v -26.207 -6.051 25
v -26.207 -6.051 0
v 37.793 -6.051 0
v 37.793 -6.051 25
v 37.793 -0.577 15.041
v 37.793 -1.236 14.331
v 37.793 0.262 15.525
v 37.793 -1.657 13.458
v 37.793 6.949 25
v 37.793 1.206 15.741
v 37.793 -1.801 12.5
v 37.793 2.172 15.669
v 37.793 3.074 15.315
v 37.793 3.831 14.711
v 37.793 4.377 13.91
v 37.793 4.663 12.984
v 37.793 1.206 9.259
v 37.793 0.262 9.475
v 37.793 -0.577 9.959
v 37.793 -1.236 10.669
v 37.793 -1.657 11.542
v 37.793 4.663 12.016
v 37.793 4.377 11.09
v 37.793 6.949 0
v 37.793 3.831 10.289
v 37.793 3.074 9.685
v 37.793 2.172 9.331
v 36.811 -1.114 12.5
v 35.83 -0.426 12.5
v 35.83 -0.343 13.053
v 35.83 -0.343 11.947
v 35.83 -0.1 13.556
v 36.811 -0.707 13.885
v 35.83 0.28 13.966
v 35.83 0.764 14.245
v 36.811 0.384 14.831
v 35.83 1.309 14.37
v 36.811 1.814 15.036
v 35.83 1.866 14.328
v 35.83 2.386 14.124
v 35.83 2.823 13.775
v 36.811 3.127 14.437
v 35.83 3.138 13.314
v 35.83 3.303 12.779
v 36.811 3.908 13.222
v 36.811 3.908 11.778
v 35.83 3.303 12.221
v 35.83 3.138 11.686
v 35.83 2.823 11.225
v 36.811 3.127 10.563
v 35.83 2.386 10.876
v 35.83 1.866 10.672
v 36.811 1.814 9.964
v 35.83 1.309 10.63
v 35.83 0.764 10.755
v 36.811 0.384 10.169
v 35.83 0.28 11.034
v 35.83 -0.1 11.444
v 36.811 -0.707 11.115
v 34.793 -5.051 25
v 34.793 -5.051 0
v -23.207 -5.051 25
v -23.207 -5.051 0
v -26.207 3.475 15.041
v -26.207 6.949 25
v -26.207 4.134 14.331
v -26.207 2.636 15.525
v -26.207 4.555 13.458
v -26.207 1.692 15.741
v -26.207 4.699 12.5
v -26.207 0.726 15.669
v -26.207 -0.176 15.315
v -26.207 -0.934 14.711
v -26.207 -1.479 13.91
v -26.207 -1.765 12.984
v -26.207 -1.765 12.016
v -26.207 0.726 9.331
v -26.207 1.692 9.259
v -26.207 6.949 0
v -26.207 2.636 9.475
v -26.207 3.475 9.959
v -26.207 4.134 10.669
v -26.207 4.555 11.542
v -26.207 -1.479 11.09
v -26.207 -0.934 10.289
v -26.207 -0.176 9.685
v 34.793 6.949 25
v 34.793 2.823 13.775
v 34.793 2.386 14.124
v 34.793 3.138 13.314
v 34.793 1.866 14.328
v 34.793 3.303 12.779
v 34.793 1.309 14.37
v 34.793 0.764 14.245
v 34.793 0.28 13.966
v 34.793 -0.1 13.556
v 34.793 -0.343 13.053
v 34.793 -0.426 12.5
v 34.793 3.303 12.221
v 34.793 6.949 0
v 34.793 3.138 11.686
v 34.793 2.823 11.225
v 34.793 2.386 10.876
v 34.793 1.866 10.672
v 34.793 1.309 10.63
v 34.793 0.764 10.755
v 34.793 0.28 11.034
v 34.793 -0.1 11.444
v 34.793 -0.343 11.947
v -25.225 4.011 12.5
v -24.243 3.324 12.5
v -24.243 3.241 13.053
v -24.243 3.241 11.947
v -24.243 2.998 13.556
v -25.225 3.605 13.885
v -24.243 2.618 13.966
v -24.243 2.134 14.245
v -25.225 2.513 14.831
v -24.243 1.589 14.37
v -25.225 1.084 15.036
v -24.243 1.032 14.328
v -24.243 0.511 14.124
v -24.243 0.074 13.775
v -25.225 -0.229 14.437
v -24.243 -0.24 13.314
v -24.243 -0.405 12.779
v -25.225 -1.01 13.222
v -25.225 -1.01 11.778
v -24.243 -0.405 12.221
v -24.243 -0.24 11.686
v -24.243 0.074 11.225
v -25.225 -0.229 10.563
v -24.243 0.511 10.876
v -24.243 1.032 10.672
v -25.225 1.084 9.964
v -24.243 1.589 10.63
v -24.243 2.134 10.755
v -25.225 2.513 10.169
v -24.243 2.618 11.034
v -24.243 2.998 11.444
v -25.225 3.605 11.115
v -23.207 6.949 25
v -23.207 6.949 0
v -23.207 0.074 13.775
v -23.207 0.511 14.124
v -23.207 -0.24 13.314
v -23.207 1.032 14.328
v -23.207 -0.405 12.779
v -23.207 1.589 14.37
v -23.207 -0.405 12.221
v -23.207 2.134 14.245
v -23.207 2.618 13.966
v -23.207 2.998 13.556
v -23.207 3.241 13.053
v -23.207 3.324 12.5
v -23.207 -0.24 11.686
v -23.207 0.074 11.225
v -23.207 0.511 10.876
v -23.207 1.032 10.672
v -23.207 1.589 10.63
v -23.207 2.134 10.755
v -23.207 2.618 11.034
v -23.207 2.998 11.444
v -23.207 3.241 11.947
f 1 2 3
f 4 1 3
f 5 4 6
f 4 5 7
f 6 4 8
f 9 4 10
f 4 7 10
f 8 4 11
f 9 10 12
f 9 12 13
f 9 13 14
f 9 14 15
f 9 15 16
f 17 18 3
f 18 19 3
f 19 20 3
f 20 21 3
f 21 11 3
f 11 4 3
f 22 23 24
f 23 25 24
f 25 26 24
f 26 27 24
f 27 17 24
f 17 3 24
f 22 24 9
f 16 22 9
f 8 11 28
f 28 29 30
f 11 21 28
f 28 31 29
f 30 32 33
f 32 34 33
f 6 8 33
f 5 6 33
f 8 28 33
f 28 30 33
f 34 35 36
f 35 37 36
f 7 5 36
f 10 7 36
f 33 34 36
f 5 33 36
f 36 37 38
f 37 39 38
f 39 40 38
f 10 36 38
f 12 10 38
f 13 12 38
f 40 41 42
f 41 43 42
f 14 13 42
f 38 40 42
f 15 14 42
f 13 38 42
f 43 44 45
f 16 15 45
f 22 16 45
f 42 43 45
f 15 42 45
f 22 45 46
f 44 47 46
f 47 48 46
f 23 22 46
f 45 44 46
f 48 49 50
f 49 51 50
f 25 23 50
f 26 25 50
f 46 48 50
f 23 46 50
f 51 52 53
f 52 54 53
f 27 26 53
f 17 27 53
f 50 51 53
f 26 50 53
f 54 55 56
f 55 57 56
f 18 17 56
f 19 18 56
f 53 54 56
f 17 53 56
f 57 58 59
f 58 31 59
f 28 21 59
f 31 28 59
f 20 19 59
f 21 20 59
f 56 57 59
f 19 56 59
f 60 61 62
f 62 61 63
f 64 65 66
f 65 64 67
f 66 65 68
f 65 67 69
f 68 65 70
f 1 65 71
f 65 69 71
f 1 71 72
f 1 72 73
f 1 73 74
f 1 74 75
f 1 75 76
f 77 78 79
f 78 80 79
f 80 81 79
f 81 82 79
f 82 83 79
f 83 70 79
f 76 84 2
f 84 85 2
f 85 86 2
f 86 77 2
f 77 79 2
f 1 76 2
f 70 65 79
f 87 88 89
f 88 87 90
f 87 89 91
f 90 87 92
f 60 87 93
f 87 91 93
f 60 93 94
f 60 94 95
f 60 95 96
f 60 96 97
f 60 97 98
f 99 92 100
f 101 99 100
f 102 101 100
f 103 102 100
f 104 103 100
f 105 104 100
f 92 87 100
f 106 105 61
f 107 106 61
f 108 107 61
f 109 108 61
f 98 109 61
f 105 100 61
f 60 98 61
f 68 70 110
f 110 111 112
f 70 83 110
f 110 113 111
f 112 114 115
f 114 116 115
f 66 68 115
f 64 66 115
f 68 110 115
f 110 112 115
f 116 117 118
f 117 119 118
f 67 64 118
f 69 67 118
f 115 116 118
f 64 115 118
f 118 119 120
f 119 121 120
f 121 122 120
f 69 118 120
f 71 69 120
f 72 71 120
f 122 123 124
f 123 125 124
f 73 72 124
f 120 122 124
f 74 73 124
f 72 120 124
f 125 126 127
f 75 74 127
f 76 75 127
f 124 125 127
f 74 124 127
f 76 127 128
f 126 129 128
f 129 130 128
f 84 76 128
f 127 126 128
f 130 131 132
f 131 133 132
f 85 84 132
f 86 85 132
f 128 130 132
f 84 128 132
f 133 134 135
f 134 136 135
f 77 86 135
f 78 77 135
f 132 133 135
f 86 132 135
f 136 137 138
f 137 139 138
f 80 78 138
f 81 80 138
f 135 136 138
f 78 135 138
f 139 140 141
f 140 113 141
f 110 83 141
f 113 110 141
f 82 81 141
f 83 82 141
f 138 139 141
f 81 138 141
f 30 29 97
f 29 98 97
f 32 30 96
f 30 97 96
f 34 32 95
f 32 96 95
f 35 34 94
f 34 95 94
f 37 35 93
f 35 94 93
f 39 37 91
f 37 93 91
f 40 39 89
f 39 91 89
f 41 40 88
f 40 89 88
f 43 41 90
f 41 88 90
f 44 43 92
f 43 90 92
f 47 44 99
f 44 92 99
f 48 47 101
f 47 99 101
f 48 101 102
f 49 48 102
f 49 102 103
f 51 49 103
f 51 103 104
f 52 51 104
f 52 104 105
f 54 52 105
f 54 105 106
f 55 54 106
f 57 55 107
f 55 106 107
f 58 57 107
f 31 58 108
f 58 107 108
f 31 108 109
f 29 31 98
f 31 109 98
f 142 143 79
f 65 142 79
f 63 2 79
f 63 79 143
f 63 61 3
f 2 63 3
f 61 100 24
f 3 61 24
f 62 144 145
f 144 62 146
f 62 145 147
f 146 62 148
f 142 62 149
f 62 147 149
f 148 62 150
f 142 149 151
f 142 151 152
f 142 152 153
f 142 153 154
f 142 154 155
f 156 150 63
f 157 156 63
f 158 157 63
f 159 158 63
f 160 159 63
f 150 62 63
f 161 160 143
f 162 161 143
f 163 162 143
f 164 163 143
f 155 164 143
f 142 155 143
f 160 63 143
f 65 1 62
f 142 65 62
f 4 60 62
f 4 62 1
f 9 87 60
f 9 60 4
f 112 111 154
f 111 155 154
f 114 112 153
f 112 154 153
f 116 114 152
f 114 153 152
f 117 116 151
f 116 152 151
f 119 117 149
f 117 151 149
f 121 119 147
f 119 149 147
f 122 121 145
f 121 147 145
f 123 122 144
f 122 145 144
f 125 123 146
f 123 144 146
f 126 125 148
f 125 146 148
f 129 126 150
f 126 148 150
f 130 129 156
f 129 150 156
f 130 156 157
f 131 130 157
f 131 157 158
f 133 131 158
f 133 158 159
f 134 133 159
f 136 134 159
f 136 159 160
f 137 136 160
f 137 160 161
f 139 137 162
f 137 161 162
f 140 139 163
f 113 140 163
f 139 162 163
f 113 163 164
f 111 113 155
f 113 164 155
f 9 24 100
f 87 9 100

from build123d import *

# Parameters (mm, degrees)
F1_DEPTH       = 25
F3_D           = 3.75
F3_DEPTH       = 6
F3_CSINK_D     = 6.5
F3_CSINK_ANGLE = 70
F5_D           = 3.75
F5_DEPTH       = 6
F5_CSINK_D     = 6.5
F5_CSINK_ANGLE = 70


with BuildPart() as f1:
    # F0 (on Top) → F1 (new body)
    with BuildSketch(Plane.XY):
        Polygon((-23.20677, 6.948909), (-26.20677, 6.948909), (-26.20677, -6.051091), (37.79323, -6.051091), (37.79323, 6.948909), (34.79323, 6.948909), (34.79323, -5.051091), (-23.20677, -5.051091), align=None)
    extrude(amount=F1_DEPTH)

    # F3
    with Locations(Plane(origin=(-26.20677, 0, 0), x_dir=(0, -1, 0), z_dir=(-1, 0, 0))):
        with Locations((-1.448909, 12.5)):
            CounterSinkHole(F3_D / 2, F3_CSINK_D / 2, depth=F3_DEPTH, counter_sink_angle=F3_CSINK_ANGLE)

    # F5
    with Locations(Plane.YZ.offset(37.79323)):
        with Locations((1.448909, 12.5)):
            CounterSinkHole(F5_D / 2, F5_CSINK_D / 2, depth=F5_DEPTH, counter_sink_angle=F5_CSINK_ANGLE)


solid = f1.part
